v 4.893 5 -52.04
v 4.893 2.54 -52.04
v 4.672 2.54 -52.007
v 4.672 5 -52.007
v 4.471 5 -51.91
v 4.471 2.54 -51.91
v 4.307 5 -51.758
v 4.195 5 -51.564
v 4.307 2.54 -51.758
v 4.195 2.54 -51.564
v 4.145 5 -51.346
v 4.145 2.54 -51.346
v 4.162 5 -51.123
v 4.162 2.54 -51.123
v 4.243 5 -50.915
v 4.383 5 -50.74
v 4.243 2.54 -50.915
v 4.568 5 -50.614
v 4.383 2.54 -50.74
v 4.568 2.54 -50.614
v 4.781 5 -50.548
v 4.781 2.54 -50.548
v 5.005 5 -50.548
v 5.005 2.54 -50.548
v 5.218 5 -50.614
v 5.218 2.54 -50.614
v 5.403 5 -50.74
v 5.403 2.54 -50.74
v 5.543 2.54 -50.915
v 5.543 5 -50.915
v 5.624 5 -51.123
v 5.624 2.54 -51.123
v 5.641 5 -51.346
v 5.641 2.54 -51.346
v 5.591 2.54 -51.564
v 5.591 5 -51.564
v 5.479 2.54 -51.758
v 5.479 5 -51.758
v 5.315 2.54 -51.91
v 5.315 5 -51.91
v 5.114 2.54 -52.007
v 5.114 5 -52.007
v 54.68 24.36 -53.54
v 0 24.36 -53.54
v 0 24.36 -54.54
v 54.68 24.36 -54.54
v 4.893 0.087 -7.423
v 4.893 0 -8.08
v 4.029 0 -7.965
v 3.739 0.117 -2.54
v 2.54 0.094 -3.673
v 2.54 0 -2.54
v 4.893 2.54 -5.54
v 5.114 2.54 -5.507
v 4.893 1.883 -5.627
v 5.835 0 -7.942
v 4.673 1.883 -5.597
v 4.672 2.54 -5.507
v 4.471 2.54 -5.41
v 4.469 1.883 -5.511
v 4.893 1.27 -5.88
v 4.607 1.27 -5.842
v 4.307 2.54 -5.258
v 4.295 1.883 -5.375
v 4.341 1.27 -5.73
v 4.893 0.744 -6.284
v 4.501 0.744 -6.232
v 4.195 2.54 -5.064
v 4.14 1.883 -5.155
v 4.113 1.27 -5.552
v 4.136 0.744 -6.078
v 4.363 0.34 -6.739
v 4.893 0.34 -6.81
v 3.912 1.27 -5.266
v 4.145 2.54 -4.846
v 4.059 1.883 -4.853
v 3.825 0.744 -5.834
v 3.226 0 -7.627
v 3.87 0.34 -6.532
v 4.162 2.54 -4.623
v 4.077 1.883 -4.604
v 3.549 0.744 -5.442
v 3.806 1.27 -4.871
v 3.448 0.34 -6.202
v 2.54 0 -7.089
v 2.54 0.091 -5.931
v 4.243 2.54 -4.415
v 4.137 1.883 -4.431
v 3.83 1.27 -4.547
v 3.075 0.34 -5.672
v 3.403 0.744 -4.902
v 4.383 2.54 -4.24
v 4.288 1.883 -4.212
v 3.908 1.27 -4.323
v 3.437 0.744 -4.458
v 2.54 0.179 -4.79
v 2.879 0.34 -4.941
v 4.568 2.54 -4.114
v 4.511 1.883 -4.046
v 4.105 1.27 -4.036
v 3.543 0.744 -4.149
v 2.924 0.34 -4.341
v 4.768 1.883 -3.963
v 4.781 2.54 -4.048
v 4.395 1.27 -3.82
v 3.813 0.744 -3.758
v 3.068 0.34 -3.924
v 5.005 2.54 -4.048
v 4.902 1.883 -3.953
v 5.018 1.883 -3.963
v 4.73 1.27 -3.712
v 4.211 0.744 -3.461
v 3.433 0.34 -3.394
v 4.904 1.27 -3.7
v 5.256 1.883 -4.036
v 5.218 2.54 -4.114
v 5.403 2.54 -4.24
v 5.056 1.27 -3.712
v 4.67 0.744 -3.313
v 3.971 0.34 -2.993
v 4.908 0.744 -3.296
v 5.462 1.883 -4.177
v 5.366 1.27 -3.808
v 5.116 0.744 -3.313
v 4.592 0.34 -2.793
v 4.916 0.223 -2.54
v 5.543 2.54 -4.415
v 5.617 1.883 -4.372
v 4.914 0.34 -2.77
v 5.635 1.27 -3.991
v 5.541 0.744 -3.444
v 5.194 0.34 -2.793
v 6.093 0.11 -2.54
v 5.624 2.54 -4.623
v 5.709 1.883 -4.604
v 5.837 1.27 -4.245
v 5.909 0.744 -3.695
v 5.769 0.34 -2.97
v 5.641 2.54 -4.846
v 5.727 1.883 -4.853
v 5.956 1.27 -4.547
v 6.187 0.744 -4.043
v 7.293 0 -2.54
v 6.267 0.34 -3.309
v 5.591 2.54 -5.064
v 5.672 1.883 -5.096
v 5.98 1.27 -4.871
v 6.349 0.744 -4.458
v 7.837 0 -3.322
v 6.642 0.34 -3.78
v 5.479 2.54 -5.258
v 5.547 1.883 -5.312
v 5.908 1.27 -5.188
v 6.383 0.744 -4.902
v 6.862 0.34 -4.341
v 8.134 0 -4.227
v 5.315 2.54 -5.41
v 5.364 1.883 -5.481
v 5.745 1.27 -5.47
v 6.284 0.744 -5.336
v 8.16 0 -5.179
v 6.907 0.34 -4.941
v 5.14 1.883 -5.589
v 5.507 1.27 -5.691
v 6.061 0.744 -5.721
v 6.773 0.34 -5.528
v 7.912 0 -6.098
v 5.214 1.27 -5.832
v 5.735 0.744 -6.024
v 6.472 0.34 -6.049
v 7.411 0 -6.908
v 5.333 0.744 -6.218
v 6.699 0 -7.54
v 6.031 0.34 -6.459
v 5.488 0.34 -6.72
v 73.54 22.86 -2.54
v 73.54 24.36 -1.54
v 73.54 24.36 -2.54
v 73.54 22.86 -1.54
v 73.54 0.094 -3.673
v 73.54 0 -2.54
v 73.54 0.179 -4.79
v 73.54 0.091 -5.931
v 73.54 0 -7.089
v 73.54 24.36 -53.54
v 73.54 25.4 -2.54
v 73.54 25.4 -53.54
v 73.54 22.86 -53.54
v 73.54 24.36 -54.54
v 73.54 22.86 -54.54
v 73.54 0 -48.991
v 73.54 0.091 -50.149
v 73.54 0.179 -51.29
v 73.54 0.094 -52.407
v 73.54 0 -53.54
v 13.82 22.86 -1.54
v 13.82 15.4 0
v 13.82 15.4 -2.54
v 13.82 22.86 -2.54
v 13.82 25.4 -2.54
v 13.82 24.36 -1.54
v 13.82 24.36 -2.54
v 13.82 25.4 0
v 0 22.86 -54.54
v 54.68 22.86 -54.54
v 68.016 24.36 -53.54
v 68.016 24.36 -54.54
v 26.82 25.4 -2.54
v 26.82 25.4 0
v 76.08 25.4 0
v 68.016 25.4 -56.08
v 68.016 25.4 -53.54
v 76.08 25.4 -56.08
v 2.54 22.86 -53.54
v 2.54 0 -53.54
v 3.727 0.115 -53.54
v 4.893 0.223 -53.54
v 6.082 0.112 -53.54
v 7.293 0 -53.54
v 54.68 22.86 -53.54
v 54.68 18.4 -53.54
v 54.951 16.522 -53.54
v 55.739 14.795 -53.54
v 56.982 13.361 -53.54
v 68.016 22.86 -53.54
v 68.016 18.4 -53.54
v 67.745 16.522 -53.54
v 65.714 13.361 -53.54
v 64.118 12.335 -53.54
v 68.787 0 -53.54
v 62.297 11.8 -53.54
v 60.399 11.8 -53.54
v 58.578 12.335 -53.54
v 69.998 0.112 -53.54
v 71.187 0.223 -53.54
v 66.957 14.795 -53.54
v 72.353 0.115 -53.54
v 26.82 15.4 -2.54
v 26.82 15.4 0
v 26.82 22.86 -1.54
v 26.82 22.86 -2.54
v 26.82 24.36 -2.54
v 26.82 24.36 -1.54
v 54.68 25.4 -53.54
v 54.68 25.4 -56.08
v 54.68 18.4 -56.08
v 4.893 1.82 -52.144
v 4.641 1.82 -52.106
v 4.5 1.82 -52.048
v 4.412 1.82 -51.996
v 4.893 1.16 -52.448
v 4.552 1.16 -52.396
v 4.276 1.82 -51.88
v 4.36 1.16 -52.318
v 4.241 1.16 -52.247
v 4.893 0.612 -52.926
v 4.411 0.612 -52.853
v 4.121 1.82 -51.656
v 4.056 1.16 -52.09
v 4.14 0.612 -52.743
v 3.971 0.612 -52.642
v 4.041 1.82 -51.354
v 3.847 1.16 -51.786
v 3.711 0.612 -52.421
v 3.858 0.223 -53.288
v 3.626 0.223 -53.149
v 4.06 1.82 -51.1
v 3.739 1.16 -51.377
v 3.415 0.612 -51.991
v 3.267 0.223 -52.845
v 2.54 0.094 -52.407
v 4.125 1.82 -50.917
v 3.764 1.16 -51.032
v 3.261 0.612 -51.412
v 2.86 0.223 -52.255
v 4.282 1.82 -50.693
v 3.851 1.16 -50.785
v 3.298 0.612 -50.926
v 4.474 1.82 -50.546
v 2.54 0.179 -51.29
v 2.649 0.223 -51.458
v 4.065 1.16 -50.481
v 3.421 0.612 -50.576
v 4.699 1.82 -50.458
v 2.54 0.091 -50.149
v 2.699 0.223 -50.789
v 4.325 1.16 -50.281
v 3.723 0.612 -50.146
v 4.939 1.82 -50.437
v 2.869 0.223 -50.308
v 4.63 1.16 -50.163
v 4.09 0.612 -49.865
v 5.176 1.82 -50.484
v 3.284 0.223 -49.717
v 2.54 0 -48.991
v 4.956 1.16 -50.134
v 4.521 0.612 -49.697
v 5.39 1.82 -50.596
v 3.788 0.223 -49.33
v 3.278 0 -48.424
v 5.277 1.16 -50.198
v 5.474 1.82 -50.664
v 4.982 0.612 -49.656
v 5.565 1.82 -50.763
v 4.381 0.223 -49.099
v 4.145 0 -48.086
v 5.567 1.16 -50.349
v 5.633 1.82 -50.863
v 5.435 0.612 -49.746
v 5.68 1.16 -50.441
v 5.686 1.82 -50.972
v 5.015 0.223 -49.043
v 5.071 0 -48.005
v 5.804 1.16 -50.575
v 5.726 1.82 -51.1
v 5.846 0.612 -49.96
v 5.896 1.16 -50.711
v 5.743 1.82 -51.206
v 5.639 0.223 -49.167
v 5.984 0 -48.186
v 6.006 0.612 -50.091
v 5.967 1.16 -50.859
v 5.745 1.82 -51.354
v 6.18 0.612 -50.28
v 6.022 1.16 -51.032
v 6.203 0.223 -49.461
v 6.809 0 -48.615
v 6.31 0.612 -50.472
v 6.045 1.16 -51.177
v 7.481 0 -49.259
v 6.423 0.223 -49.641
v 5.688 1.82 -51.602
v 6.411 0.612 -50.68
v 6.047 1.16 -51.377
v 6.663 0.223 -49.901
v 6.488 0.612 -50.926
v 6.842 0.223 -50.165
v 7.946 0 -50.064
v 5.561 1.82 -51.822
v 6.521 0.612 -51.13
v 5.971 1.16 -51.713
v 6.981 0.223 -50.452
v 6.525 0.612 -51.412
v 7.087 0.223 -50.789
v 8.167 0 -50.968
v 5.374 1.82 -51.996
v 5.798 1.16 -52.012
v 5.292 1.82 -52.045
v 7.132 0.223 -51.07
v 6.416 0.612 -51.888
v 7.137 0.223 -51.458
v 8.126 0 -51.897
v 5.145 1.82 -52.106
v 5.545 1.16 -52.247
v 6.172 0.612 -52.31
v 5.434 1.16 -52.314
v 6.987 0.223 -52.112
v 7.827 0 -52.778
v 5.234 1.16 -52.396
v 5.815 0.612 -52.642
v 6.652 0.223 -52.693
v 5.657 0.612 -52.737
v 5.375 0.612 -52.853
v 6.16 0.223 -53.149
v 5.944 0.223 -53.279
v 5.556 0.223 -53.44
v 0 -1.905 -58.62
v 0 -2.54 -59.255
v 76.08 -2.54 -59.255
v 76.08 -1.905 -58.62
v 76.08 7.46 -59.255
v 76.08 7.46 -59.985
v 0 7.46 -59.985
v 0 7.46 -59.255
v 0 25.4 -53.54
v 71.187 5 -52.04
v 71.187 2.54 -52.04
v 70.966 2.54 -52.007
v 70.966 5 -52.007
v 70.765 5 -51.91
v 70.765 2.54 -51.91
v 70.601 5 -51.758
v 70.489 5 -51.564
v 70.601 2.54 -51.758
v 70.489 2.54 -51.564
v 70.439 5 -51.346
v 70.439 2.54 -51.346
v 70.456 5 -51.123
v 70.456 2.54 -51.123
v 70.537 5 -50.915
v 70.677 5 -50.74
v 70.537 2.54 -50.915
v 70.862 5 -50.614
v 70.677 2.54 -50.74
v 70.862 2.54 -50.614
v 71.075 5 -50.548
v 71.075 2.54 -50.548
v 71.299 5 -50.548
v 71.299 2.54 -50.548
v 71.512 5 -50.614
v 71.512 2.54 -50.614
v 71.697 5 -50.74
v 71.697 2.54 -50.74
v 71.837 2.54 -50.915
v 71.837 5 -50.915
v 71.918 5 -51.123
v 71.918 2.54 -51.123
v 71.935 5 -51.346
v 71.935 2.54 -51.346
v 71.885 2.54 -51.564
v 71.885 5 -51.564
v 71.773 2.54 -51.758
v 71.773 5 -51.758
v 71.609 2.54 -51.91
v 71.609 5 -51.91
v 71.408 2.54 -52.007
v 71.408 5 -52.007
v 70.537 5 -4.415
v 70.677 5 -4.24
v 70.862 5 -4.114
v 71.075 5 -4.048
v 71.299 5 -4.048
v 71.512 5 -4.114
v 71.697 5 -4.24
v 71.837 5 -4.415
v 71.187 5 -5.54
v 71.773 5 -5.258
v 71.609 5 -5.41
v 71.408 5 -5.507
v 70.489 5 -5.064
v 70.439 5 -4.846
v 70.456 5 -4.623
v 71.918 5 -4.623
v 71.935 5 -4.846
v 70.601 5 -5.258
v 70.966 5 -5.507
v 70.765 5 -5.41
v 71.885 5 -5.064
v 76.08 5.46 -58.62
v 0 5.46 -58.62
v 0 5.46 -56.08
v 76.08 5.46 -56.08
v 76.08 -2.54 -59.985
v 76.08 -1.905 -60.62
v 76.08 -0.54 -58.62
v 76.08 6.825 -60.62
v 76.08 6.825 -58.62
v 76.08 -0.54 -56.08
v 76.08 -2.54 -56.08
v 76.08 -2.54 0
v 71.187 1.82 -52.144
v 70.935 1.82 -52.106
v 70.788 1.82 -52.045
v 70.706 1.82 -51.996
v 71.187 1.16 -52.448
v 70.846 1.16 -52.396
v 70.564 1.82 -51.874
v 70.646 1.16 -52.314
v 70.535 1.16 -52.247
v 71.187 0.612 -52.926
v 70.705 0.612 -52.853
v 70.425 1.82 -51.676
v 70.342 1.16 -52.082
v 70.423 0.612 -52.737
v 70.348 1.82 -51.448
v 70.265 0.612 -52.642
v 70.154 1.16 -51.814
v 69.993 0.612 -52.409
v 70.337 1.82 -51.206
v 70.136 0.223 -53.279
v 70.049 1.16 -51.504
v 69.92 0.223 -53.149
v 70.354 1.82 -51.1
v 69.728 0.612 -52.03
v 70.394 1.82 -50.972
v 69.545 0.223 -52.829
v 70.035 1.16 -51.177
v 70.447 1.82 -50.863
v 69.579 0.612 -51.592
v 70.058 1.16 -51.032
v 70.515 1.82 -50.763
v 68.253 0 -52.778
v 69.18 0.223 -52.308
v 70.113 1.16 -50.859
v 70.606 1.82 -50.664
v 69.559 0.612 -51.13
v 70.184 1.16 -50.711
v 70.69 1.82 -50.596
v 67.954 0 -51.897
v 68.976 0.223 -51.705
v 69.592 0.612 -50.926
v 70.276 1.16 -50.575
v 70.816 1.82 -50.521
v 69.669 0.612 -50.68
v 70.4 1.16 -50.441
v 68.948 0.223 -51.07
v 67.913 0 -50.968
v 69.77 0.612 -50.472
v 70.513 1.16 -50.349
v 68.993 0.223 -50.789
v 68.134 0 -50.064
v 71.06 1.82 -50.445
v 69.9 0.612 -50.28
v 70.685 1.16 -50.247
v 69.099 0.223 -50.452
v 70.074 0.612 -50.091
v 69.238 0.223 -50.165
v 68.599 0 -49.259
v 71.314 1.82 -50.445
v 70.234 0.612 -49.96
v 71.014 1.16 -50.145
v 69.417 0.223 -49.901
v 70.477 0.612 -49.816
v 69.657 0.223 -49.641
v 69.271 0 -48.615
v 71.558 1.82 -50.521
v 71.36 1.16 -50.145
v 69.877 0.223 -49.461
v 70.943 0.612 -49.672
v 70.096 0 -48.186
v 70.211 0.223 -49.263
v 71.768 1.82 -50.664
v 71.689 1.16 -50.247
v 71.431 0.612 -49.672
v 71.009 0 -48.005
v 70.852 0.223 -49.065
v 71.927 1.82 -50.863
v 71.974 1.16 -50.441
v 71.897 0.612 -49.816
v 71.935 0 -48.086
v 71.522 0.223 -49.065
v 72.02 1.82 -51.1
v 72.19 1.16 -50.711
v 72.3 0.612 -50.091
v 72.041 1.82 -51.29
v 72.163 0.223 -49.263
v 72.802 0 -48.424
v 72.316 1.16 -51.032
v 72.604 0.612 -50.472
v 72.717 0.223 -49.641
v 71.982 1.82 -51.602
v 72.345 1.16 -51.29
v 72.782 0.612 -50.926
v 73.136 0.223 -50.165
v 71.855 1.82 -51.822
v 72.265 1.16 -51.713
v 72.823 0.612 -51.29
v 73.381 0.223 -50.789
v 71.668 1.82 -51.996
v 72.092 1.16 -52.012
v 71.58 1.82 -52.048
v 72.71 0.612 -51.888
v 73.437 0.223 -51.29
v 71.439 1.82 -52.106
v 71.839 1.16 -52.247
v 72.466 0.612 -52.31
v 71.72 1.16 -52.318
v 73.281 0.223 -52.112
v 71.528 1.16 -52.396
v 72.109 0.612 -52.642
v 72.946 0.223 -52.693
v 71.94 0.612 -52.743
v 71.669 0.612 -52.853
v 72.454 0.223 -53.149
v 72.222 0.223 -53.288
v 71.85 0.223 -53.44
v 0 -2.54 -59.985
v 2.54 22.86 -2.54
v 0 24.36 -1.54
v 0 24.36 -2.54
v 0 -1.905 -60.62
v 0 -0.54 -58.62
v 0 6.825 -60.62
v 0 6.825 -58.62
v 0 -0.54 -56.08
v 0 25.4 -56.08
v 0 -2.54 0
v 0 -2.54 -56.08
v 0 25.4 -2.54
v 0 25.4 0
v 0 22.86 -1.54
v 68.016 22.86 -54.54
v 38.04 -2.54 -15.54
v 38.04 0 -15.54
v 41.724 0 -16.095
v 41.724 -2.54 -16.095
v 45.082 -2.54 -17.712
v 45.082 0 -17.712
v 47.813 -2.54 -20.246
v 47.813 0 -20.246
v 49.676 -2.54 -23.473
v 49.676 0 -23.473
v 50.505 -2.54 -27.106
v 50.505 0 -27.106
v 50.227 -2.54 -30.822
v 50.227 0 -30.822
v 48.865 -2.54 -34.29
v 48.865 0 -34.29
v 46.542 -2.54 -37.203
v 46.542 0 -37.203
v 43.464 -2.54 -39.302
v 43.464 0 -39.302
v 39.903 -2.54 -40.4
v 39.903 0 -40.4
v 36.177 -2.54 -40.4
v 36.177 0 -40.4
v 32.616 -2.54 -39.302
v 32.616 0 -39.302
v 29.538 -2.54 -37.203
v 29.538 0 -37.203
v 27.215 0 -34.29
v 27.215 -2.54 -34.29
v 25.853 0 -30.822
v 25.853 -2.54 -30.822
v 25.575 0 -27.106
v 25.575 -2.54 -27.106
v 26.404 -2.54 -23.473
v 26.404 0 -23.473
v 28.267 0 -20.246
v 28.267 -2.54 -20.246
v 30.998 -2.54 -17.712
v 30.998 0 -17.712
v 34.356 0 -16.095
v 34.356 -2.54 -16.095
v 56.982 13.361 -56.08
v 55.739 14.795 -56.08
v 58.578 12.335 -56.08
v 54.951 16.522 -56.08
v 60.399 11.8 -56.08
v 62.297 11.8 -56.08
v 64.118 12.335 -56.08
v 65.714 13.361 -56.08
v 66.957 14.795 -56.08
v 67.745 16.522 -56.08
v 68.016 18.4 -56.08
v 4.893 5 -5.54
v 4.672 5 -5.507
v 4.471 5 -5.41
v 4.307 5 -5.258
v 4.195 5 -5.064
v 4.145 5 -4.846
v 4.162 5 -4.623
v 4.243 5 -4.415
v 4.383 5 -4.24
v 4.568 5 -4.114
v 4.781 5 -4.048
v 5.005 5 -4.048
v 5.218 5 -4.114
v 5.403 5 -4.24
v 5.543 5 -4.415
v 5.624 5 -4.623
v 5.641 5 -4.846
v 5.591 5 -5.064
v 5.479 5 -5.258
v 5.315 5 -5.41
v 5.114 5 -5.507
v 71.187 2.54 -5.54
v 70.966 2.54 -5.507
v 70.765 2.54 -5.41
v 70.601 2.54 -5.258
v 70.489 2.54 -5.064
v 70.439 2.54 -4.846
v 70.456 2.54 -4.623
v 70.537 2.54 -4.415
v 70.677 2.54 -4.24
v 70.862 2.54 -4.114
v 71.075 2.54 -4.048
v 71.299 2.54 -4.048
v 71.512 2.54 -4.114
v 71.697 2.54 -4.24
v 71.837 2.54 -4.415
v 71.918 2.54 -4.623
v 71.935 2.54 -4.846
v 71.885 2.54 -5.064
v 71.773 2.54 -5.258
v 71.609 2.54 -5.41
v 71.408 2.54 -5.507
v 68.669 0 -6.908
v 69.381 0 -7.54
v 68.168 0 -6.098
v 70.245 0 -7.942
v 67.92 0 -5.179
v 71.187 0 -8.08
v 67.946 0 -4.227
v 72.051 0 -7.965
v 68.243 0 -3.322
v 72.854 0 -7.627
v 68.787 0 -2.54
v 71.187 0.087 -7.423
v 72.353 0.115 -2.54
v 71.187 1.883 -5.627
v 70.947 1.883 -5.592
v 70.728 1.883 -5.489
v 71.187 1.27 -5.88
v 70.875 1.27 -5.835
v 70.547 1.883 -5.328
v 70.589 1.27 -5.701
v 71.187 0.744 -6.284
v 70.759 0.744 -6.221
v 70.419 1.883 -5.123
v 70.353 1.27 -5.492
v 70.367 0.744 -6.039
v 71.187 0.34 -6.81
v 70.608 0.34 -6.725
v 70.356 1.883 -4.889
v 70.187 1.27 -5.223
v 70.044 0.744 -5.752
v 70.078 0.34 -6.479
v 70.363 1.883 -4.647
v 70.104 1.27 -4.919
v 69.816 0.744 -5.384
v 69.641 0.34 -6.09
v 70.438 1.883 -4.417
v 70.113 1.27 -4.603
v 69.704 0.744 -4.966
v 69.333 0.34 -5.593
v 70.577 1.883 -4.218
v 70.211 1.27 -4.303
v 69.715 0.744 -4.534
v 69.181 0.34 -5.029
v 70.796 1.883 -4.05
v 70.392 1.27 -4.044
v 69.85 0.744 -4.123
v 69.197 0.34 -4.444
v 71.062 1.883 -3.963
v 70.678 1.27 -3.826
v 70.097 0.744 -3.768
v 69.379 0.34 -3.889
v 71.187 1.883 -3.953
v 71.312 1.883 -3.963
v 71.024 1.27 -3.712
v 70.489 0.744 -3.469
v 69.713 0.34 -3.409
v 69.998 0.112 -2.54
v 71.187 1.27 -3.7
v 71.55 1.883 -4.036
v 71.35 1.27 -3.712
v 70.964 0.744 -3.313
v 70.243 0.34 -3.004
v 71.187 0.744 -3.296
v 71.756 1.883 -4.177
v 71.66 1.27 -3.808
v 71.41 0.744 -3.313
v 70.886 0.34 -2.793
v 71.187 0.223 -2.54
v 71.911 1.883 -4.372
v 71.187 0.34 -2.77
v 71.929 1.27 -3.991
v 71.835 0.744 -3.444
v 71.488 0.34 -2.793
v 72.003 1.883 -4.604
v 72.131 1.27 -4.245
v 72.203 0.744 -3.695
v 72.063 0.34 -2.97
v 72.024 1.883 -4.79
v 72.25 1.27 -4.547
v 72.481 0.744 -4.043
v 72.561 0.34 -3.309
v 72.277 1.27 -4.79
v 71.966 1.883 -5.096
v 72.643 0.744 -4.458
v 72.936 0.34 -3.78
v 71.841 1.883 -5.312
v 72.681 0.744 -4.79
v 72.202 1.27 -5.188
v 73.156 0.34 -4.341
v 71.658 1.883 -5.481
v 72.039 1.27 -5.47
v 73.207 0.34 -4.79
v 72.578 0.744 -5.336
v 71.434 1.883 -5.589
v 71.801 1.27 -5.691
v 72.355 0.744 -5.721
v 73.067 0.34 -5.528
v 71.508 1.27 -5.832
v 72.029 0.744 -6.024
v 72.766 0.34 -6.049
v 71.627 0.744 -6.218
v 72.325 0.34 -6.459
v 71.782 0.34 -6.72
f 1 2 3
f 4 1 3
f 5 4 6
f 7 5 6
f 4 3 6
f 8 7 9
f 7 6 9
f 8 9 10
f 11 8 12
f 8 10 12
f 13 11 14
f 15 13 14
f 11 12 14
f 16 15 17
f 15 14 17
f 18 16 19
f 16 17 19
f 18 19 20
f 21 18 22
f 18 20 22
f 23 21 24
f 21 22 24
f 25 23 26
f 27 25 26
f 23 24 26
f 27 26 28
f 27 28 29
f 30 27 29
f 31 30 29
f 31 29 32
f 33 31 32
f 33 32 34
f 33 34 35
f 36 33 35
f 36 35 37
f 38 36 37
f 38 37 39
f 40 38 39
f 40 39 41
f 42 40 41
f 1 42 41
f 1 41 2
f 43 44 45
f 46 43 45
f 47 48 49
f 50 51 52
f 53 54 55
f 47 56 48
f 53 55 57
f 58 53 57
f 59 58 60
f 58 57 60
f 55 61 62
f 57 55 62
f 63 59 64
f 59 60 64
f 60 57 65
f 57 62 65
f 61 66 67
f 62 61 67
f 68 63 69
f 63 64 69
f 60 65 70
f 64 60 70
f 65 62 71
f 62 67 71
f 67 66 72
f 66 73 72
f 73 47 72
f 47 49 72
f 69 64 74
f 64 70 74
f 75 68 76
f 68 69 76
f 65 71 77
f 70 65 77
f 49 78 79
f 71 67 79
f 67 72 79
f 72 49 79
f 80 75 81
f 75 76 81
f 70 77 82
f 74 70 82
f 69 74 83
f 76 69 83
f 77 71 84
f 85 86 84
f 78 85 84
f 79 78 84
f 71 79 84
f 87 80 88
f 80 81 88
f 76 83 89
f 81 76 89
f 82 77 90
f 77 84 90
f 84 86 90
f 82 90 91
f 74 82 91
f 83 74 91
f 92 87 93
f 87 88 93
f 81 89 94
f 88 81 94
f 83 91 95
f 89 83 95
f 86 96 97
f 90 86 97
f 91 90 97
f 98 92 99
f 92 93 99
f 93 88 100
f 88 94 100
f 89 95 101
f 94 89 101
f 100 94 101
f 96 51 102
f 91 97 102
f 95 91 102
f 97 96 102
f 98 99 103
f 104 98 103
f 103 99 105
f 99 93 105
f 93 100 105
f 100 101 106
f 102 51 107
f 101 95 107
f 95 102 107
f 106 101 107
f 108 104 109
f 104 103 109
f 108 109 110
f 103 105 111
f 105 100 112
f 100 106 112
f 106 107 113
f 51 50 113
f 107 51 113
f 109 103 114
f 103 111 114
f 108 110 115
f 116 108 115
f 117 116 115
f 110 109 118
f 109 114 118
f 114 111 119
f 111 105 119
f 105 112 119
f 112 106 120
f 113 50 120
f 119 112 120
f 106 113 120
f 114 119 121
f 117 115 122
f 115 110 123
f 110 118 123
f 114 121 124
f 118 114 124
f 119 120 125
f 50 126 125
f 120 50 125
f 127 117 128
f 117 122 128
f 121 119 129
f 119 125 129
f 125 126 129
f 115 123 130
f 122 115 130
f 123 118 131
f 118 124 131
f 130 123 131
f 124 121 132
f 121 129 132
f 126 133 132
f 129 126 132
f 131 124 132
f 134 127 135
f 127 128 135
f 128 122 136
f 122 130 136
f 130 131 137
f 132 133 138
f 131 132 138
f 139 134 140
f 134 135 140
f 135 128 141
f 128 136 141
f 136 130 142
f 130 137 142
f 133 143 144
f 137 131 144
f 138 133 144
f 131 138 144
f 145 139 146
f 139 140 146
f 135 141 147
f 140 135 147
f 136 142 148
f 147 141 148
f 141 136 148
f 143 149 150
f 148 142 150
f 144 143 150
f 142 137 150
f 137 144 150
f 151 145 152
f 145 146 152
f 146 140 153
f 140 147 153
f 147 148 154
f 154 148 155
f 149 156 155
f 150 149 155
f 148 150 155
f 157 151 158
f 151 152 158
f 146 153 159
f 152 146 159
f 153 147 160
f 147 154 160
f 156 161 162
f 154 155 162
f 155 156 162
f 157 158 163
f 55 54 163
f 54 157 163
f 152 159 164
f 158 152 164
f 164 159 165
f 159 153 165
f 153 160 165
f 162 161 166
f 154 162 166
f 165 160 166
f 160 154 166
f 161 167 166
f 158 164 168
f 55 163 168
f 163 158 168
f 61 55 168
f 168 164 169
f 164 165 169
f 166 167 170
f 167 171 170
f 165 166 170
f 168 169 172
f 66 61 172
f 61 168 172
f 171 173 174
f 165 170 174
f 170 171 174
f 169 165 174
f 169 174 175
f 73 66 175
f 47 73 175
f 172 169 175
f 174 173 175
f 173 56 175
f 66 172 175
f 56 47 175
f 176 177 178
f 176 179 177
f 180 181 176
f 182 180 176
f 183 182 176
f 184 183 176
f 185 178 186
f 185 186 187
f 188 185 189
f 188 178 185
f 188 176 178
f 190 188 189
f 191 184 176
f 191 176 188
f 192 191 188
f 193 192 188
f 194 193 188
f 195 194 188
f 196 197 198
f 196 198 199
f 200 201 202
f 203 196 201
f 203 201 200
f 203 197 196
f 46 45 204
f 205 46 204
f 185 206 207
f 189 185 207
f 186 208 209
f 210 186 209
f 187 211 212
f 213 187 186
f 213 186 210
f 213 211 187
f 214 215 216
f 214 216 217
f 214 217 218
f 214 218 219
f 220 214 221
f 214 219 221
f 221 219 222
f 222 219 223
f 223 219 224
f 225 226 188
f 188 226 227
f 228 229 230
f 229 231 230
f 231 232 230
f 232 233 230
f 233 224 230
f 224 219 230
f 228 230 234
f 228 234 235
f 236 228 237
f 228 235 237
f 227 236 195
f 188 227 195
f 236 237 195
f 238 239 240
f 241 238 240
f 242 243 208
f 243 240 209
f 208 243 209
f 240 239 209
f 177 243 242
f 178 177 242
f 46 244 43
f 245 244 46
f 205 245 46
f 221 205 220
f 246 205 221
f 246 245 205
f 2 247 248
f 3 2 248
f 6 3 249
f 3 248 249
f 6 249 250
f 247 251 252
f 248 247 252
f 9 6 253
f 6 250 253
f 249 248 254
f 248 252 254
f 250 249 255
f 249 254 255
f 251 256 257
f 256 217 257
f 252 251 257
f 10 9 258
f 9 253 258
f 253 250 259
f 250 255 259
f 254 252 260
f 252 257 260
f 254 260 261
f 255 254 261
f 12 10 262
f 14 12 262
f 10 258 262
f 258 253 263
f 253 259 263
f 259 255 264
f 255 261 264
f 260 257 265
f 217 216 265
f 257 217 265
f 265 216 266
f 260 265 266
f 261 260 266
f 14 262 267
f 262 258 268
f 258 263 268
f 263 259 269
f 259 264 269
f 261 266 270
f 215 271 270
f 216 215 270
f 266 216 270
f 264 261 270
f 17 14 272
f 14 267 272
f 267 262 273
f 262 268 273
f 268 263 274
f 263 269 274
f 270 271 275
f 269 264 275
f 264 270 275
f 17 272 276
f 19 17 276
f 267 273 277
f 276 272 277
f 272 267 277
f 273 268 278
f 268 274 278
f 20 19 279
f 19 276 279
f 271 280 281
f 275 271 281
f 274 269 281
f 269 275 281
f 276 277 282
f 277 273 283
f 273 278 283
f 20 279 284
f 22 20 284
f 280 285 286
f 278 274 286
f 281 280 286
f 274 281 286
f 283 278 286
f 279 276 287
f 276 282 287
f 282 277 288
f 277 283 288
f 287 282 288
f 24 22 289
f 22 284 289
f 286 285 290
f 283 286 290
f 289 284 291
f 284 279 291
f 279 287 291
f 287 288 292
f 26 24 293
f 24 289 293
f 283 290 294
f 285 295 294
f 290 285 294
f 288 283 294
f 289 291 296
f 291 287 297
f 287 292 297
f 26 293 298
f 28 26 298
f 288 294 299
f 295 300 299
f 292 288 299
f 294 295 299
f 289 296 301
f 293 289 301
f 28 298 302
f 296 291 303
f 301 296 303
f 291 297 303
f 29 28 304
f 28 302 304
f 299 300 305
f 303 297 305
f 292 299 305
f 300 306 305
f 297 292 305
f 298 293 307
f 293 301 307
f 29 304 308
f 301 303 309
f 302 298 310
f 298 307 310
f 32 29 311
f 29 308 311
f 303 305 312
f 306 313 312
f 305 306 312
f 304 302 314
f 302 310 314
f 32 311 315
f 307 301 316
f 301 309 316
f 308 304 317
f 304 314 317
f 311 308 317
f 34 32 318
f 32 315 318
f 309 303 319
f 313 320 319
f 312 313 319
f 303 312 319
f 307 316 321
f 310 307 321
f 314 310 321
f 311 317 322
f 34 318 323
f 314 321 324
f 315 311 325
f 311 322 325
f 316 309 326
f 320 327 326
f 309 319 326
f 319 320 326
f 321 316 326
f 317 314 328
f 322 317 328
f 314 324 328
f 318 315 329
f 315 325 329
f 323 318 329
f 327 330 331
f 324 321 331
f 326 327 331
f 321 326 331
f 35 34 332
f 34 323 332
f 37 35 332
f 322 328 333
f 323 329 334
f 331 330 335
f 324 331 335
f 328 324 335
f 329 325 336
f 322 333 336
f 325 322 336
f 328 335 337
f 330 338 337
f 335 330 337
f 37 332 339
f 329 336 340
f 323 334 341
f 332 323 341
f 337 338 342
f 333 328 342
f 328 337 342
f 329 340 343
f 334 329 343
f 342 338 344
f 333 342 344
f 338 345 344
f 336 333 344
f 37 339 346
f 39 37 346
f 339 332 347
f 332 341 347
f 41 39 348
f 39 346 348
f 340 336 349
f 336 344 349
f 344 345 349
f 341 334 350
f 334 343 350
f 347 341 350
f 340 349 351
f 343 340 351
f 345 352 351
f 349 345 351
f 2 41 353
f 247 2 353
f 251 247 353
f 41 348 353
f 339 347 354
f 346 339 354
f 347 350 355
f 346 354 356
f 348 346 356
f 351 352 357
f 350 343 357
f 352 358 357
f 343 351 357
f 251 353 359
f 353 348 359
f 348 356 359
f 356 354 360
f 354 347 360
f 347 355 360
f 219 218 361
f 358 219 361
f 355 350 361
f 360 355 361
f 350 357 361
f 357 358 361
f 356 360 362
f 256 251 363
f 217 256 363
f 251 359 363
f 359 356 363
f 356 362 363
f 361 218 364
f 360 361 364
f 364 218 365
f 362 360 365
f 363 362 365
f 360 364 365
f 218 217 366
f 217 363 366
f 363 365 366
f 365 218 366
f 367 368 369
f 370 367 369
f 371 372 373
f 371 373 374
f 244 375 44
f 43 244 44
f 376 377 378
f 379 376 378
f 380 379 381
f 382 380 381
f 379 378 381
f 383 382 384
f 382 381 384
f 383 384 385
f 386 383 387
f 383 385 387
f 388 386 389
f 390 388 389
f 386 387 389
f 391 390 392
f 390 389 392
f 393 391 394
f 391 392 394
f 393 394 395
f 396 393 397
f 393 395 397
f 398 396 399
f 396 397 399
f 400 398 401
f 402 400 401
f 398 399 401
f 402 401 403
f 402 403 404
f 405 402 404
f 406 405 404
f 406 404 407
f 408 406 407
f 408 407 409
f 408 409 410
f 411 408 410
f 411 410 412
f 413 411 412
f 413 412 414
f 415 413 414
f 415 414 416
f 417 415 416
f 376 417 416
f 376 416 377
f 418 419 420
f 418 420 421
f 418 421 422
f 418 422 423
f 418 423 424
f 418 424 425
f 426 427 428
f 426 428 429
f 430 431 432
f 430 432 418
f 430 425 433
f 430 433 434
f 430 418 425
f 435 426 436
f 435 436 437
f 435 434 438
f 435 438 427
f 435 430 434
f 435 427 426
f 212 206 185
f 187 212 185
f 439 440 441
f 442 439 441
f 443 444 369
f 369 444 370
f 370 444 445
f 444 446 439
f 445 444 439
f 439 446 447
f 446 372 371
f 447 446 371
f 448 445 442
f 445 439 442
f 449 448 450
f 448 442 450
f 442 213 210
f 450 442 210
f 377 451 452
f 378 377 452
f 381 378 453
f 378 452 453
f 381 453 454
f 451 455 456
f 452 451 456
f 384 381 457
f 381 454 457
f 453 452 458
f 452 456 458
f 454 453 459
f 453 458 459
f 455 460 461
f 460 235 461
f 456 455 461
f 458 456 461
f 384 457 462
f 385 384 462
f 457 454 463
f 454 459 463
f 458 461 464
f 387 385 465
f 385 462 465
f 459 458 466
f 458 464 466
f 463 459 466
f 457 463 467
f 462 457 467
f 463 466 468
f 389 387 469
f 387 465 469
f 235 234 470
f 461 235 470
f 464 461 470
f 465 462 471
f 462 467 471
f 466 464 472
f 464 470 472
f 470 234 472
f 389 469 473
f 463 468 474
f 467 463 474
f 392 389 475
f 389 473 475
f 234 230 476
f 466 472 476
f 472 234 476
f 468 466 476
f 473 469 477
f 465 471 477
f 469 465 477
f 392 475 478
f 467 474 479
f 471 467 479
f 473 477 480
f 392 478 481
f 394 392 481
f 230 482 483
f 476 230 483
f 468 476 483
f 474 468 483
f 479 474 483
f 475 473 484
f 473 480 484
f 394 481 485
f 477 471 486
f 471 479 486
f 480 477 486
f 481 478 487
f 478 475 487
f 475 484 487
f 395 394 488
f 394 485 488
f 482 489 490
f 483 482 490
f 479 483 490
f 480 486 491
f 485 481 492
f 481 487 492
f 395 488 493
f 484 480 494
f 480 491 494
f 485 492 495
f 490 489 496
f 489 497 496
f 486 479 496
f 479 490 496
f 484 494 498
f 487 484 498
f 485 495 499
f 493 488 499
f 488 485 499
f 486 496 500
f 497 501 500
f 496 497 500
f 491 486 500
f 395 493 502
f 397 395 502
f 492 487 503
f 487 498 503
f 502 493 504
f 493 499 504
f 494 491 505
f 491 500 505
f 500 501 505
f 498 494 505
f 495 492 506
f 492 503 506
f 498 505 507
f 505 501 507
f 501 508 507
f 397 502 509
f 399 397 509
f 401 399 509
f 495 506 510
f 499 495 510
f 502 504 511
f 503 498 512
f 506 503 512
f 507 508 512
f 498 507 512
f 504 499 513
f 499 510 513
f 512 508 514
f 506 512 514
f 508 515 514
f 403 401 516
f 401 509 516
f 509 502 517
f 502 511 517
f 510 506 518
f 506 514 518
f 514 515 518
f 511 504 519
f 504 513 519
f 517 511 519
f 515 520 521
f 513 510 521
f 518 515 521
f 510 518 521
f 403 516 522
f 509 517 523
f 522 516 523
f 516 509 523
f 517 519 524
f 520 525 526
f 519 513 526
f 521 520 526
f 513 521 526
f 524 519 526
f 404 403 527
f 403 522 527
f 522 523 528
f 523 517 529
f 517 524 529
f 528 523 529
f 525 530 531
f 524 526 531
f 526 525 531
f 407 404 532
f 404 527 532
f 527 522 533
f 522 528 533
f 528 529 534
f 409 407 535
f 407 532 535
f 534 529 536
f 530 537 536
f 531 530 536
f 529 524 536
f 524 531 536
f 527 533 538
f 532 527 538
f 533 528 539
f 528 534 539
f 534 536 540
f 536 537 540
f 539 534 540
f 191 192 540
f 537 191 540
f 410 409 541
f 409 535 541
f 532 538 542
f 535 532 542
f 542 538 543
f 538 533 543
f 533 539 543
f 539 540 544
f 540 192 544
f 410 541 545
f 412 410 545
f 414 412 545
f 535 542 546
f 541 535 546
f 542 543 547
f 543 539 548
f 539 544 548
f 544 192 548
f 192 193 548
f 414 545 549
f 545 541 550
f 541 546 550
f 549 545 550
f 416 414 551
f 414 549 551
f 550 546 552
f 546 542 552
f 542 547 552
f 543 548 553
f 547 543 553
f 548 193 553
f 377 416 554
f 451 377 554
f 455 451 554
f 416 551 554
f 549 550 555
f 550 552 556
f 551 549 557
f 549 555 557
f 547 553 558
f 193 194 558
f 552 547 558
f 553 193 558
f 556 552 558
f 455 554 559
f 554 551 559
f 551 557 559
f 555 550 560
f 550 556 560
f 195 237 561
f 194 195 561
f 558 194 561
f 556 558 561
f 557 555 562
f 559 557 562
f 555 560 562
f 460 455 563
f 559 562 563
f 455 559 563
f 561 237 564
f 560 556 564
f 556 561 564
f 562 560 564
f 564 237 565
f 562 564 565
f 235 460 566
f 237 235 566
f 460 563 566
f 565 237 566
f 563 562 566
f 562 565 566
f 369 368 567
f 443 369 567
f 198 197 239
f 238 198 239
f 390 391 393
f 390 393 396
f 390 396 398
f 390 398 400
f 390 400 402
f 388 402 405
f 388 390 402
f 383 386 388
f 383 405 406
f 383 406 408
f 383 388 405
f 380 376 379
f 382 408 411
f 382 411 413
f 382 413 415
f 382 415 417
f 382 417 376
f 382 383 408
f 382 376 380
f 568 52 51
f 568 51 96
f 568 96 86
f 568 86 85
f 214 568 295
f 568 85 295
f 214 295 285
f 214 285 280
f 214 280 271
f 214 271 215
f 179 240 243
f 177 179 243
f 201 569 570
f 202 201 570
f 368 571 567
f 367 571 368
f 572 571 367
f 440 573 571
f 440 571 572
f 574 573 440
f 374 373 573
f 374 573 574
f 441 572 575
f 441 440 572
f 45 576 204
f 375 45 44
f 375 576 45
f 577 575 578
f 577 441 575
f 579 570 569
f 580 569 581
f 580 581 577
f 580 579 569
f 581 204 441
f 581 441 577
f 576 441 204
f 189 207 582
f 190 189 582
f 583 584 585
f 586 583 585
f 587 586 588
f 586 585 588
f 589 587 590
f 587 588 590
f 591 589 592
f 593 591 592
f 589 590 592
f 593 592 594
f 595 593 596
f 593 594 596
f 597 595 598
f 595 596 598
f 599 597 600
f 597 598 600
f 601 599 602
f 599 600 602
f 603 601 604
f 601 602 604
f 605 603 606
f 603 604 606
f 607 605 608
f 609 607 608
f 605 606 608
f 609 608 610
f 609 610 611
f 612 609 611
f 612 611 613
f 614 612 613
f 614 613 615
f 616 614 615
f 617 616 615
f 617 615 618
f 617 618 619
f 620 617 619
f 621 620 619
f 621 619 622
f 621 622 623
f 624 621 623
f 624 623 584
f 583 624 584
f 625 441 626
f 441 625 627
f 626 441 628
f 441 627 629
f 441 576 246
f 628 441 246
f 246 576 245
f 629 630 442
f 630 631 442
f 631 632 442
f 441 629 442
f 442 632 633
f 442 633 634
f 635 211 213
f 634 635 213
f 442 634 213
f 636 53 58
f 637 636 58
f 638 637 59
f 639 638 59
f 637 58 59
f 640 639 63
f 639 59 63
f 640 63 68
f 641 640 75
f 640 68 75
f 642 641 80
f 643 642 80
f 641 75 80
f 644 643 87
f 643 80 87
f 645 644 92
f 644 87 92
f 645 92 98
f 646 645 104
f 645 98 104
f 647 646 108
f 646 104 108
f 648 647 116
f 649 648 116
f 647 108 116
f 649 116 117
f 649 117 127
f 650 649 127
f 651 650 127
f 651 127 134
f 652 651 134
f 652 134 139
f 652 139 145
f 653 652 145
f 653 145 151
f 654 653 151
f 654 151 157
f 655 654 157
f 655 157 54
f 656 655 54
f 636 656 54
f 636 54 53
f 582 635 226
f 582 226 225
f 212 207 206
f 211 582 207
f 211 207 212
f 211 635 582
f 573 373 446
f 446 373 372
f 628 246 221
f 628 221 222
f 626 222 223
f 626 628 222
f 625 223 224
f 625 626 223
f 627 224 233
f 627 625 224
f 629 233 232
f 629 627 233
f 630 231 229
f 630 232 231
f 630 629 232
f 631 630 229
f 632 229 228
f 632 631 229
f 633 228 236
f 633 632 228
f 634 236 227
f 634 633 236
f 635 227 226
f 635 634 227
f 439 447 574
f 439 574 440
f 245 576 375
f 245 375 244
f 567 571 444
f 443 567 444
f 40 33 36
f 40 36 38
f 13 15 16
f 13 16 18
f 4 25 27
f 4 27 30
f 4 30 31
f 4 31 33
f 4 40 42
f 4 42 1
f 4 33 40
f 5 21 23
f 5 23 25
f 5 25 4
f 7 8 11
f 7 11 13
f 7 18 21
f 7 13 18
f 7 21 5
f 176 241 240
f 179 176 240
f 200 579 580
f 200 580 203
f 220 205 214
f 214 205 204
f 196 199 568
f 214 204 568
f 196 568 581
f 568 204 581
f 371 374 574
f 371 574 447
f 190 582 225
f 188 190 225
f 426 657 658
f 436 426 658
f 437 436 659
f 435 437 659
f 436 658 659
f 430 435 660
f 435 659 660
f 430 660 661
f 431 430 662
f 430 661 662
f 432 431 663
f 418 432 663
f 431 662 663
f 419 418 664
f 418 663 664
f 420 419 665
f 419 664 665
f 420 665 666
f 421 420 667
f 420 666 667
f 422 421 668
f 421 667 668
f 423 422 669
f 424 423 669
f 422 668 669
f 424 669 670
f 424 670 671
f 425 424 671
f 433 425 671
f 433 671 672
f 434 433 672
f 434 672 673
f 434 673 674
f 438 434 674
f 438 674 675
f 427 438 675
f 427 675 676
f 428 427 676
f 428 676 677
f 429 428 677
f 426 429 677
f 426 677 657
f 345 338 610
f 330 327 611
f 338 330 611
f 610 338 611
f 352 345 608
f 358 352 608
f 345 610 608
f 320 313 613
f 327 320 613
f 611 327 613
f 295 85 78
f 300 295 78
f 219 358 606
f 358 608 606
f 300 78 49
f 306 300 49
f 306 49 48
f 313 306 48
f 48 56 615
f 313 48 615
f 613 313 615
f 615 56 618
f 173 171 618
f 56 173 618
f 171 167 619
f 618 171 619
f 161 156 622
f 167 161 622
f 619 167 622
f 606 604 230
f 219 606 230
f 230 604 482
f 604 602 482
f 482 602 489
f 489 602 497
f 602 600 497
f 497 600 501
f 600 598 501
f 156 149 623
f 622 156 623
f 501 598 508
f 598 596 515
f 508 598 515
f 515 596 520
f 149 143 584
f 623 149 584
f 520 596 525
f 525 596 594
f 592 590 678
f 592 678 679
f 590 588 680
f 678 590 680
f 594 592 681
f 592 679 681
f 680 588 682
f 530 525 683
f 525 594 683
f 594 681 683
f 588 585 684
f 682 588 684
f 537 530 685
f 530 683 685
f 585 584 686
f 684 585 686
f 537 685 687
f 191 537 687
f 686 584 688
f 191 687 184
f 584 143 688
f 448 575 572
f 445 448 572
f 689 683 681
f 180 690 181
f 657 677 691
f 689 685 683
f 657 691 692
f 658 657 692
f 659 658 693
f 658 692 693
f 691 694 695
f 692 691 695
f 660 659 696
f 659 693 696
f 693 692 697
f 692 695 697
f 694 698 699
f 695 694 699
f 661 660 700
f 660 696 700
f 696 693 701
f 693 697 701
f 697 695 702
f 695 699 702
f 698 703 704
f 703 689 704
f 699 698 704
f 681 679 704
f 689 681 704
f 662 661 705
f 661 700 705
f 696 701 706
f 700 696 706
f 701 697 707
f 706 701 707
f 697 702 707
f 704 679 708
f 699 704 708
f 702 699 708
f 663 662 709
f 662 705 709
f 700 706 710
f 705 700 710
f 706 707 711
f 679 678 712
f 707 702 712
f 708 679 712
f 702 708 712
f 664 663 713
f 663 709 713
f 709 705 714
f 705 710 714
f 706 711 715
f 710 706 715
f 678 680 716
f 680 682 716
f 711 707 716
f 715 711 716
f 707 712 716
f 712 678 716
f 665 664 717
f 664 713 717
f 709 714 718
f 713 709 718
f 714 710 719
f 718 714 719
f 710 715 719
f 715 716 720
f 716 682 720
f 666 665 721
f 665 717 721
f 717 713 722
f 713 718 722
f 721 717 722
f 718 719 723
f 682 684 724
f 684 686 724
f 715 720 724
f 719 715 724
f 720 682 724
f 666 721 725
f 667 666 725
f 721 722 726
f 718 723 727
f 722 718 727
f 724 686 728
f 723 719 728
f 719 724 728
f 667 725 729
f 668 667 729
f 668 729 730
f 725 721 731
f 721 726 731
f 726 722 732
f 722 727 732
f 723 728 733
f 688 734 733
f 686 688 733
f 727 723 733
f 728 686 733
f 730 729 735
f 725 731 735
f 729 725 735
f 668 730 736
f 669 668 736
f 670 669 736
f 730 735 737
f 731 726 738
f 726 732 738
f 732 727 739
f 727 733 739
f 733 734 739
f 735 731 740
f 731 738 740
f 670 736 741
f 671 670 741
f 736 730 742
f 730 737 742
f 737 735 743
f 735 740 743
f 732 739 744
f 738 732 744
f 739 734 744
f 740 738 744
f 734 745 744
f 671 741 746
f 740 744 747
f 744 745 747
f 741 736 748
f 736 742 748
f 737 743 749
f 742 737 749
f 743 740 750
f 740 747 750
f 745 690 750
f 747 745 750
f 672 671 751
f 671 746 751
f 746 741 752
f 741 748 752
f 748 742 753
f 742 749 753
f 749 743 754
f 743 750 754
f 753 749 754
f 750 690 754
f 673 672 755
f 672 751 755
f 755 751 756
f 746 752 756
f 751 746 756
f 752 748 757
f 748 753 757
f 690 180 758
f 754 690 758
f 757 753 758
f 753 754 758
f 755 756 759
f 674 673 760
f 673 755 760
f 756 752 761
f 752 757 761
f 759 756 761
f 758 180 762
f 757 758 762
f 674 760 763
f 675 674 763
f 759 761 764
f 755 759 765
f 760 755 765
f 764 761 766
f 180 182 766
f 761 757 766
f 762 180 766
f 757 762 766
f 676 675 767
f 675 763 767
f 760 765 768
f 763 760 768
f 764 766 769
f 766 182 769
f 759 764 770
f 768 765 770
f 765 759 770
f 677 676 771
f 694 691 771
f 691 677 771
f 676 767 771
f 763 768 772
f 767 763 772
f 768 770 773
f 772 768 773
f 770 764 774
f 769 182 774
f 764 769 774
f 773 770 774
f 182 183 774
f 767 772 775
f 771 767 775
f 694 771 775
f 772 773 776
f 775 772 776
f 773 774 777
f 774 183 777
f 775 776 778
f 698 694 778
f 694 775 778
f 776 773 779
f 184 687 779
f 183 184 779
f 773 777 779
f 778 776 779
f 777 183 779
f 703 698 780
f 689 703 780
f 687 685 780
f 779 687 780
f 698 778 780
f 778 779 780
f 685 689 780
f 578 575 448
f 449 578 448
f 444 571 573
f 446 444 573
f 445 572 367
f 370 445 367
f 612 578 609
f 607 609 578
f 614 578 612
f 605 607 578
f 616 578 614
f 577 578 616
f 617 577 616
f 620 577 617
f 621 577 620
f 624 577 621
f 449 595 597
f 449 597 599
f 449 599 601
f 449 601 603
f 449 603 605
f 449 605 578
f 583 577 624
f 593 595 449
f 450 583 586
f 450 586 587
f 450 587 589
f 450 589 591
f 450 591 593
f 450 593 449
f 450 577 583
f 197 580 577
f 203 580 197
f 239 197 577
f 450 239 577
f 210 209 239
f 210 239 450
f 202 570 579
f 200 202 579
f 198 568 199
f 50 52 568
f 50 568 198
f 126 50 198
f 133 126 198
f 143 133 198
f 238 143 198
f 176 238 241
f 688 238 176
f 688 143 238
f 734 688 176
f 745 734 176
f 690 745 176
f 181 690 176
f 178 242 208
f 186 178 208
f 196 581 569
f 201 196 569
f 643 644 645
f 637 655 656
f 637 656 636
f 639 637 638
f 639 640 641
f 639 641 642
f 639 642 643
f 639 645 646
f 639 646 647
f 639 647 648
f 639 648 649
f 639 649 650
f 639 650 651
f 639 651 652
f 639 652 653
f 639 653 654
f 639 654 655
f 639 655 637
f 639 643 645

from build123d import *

# Parameters (mm, degrees)
SKETCH1_W           = 76.08
SKETCH1_H           = 56.08
SKETCH1_W_2         = 71
SKETCH1_H_2         = 51
BOSS_EXTRUDE1_DEPTH = 25.4
SKETCH2_W           = 76.08
SKETCH2_H           = 56.08
BOSS_EXTRUDE2_DEPTH = 2.54
CUT_EXTRUDE1_REACH  = 99.869
CUT_EXTRUDE2_REACH  = 99.869
SKETCH5_R           = 0.75
BOSS_EXTRUDE3_DEPTH = 5
FILLET1_R           = 2.54
CUT_EXTRUDE3_REACH  = 99.869
SKETCH6_W           = 13
SKETCH6_H           = 10
BOSS_EXTRUDE4_DEPTH = 76.08
CHAMFER1_SIZE       = 0.635
SKETCH9_R           = 12.5
CUT_EXTRUDE4_DEPTH  = 101.539100877


with BuildPart() as part:
    # Sketch1 → Boss-Extrude1 (new body)
    with BuildSketch(Plane(origin=(0, 0, 0), x_dir=(1, 0, 0), z_dir=(0, 1, 0))):
        with Locations((38.04, 28.04)):
            Rectangle(SKETCH1_W, SKETCH1_H)
        with Locations((38.04, 28.04)):
            Rectangle(SKETCH1_W_2, SKETCH1_H_2, mode=Mode.SUBTRACT)
    extrude(amount=BOSS_EXTRUDE1_DEPTH)

    # Sketch2 → Boss-Extrude2 (add)
    with BuildSketch(Plane.XZ):
        with Locations((38.04, -28.04)):
            Rectangle(SKETCH2_W, SKETCH2_H)
    extrude(amount=BOSS_EXTRUDE2_DEPTH)

    # Sketch3 → Cut-Extrude1 (cut, up to next)
    with BuildSketch(Plane(origin=(0, 0, -56.08), x_dir=(-1, 0, 0), z_dir=(0, 0, -1)), mode=Mode.PRIVATE) as cut_extrude1_sk1:
        with BuildLine():
            Line((-68.0155, 18.400004), (-68.0155, 25.4))
            Line((-68.0155, 25.4), (-54.6805, 25.4))
            Line((-54.6805, 25.4), (-54.6805, 18.400004))
            ThreePointArc((-54.6805, 18.400004), (-61.348, 11.732504), (-68.0155, 18.400004))
        make_face()
    cut_extrude1_tool1 = extrude(cut_extrude1_sk1.sketch, amount=-CUT_EXTRUDE1_REACH, mode=Mode.PRIVATE) & part.part
    add(cut_extrude1_tool1.solids().sort_by_distance((61.348, 19.19119, -56.08))[0], mode=Mode.SUBTRACT)

    # Cut-Extrude2: up to this face of the body (flat: up to its plane)
    cut_extrude2_end = Plane(part.part.faces().sort_by_distance((73.54, 12.7, -28.04))[0])
    # Sketch4 → Cut-Extrude2 (cut, up to the picked face)
    with BuildSketch(Plane.ZY, mode=Mode.PRIVATE) as cut_extrude2_sk1:
        Polygon((-53.54, 25.4), (-53.54, 24.359997), (-54.54, 24.359997), (-54.54, 22.86), (-1.54, 22.86), (-1.54, 24.359997), (-2.54, 24.359997), (-2.54, 25.4), align=None)
    cut_extrude2_tool1 = split(extrude(cut_extrude2_sk1.sketch, amount=-CUT_EXTRUDE2_REACH, mode=Mode.PRIVATE), bisect_by=cut_extrude2_end, keep=Keep.BOTH, mode=Mode.PRIVATE)
    add(cut_extrude2_tool1.solids().sort_by(Axis((0, 24.11823, -28.04), (1, 0, 0)))[0], mode=Mode.SUBTRACT)

    # Sketch5 → Boss-Extrude3 (add)
    with BuildSketch(Plane(origin=(0, 0, 0), x_dir=(1, 0, 0), z_dir=(0, 1, 0))):
        with Locations(Location((4.893, 51.28999999, 0), (0, 0, 90))):
            Circle(SKETCH5_R)
        with Locations(Location((4.893, 4.79000001, 0), (0, 0, 90))):
            Circle(SKETCH5_R)
        with Locations(Location((71.187, 4.79000001, 0), (0, 0, 90))):
            Circle(SKETCH5_R)
        with Locations(Location((71.187, 51.28999999, 0), (0, 0, 90))):
            Circle(SKETCH5_R)
    extrude(amount=BOSS_EXTRUDE3_DEPTH)

    # Fillet1
    # the kernel refuses this fillet: 2.54 mm, written as the material it adds along each edge
    with BuildSketch(Plane(origin=(4.893, 0, -51.28999999), x_dir=(0, 0, -1), z_dir=(1, 0, 0))) as fillet1_piece_1:
        with BuildLine():
            CenterArc((0.75 + FILLET1_R, FILLET1_R), FILLET1_R, 180, 90)
            Line((0.75, FILLET1_R), (0.75, 0))
            Line((0.75, 0), (0.75 + FILLET1_R, 0))
        make_face()
    revolve(axis=Axis((4.893, 0, -51.28999999), (0, 1, 0)))
    with BuildSketch(Plane(origin=(4.893, 0, -4.79000001), x_dir=(0, 0, -1), z_dir=(1, 0, 0))) as fillet1_piece_2:
        with BuildLine():
            CenterArc((0.75 + FILLET1_R, FILLET1_R), FILLET1_R, 180, 90)
            Line((0.75, FILLET1_R), (0.75, 0))
            Line((0.75, 0), (0.75 + FILLET1_R, 0))
        make_face()
    revolve(axis=Axis((4.893, 0, -4.79000001), (0, 1, 0)))
    with BuildSketch(Plane(origin=(71.187, 0, -4.79000001), x_dir=(0, 0, -1), z_dir=(1, 0, 0))) as fillet1_piece_3:
        with BuildLine():
            CenterArc((0.75 + FILLET1_R, FILLET1_R), FILLET1_R, 180, 90)
            Line((0.75, FILLET1_R), (0.75, 0))
            Line((0.75, 0), (0.75 + FILLET1_R, 0))
        make_face()
    revolve(axis=Axis((71.187, 0, -4.79000001), (0, 1, 0)))
    with BuildSketch(Plane(origin=(71.187, 0, -51.28999999), x_dir=(0, 0, -1), z_dir=(1, 0, 0))) as fillet1_piece_4:
        with BuildLine():
            CenterArc((0.75 + FILLET1_R, FILLET1_R), FILLET1_R, 180, 90)
            Line((0.75, FILLET1_R), (0.75, 0))
            Line((0.75, 0), (0.75 + FILLET1_R, 0))
        make_face()
    revolve(axis=Axis((71.187, 0, -51.28999999), (0, 1, 0)))

    # Sketch6 → Cut-Extrude3 (cut, up to next)
    with BuildSketch(Plane.XY, mode=Mode.PRIVATE) as cut_extrude3_sk1:
        with Locations((20.32, 20.4)):
            Rectangle(SKETCH6_W, SKETCH6_H)
    cut_extrude3_tool1 = extrude(cut_extrude3_sk1.sketch, amount=-CUT_EXTRUDE3_REACH, mode=Mode.PRIVATE) & part.part
    add(cut_extrude3_tool1.solids().sort_by_distance((20.32, 20.4, 0))[0], mode=Mode.SUBTRACT)

    # Sketch7 → Boss-Extrude4 (add)
    with BuildSketch(Plane.ZY):
        Polygon((-56.08, -0.54), (-58.62, -0.54), (-58.62, -2.54), (-60.62, -2.54), (-60.62, 7.46), (-58.62, 7.46), (-58.62, 5.46), (-56.08, 5.46), align=None)
    extrude(amount=-BOSS_EXTRUDE4_DEPTH)

    # Chamfer1
    chamfer1_edges = [part.edges().sort_by_distance(p)[0] for p in [
        (38.04, -2.54, -58.62),
        (38.04, -2.54, -60.62),
        (38.04, 7.46, -60.62),
        (38.04, 7.46, -58.62),
    ]]
    chamfer(chamfer1_edges, length=CHAMFER1_SIZE)

    # Sketch9 → Cut-Extrude4 (cut, through all)
    with BuildSketch(Plane(origin=(0, 0, 0), x_dir=(1, 0, 0), z_dir=(0, 1, 0))):
        with Locations(Location((38.04, 28.04, 0), (0, 0, 270))):
            Circle(SKETCH9_R)
    extrude(amount=-CUT_EXTRUDE4_DEPTH, mode=Mode.SUBTRACT)


solid = part.part
